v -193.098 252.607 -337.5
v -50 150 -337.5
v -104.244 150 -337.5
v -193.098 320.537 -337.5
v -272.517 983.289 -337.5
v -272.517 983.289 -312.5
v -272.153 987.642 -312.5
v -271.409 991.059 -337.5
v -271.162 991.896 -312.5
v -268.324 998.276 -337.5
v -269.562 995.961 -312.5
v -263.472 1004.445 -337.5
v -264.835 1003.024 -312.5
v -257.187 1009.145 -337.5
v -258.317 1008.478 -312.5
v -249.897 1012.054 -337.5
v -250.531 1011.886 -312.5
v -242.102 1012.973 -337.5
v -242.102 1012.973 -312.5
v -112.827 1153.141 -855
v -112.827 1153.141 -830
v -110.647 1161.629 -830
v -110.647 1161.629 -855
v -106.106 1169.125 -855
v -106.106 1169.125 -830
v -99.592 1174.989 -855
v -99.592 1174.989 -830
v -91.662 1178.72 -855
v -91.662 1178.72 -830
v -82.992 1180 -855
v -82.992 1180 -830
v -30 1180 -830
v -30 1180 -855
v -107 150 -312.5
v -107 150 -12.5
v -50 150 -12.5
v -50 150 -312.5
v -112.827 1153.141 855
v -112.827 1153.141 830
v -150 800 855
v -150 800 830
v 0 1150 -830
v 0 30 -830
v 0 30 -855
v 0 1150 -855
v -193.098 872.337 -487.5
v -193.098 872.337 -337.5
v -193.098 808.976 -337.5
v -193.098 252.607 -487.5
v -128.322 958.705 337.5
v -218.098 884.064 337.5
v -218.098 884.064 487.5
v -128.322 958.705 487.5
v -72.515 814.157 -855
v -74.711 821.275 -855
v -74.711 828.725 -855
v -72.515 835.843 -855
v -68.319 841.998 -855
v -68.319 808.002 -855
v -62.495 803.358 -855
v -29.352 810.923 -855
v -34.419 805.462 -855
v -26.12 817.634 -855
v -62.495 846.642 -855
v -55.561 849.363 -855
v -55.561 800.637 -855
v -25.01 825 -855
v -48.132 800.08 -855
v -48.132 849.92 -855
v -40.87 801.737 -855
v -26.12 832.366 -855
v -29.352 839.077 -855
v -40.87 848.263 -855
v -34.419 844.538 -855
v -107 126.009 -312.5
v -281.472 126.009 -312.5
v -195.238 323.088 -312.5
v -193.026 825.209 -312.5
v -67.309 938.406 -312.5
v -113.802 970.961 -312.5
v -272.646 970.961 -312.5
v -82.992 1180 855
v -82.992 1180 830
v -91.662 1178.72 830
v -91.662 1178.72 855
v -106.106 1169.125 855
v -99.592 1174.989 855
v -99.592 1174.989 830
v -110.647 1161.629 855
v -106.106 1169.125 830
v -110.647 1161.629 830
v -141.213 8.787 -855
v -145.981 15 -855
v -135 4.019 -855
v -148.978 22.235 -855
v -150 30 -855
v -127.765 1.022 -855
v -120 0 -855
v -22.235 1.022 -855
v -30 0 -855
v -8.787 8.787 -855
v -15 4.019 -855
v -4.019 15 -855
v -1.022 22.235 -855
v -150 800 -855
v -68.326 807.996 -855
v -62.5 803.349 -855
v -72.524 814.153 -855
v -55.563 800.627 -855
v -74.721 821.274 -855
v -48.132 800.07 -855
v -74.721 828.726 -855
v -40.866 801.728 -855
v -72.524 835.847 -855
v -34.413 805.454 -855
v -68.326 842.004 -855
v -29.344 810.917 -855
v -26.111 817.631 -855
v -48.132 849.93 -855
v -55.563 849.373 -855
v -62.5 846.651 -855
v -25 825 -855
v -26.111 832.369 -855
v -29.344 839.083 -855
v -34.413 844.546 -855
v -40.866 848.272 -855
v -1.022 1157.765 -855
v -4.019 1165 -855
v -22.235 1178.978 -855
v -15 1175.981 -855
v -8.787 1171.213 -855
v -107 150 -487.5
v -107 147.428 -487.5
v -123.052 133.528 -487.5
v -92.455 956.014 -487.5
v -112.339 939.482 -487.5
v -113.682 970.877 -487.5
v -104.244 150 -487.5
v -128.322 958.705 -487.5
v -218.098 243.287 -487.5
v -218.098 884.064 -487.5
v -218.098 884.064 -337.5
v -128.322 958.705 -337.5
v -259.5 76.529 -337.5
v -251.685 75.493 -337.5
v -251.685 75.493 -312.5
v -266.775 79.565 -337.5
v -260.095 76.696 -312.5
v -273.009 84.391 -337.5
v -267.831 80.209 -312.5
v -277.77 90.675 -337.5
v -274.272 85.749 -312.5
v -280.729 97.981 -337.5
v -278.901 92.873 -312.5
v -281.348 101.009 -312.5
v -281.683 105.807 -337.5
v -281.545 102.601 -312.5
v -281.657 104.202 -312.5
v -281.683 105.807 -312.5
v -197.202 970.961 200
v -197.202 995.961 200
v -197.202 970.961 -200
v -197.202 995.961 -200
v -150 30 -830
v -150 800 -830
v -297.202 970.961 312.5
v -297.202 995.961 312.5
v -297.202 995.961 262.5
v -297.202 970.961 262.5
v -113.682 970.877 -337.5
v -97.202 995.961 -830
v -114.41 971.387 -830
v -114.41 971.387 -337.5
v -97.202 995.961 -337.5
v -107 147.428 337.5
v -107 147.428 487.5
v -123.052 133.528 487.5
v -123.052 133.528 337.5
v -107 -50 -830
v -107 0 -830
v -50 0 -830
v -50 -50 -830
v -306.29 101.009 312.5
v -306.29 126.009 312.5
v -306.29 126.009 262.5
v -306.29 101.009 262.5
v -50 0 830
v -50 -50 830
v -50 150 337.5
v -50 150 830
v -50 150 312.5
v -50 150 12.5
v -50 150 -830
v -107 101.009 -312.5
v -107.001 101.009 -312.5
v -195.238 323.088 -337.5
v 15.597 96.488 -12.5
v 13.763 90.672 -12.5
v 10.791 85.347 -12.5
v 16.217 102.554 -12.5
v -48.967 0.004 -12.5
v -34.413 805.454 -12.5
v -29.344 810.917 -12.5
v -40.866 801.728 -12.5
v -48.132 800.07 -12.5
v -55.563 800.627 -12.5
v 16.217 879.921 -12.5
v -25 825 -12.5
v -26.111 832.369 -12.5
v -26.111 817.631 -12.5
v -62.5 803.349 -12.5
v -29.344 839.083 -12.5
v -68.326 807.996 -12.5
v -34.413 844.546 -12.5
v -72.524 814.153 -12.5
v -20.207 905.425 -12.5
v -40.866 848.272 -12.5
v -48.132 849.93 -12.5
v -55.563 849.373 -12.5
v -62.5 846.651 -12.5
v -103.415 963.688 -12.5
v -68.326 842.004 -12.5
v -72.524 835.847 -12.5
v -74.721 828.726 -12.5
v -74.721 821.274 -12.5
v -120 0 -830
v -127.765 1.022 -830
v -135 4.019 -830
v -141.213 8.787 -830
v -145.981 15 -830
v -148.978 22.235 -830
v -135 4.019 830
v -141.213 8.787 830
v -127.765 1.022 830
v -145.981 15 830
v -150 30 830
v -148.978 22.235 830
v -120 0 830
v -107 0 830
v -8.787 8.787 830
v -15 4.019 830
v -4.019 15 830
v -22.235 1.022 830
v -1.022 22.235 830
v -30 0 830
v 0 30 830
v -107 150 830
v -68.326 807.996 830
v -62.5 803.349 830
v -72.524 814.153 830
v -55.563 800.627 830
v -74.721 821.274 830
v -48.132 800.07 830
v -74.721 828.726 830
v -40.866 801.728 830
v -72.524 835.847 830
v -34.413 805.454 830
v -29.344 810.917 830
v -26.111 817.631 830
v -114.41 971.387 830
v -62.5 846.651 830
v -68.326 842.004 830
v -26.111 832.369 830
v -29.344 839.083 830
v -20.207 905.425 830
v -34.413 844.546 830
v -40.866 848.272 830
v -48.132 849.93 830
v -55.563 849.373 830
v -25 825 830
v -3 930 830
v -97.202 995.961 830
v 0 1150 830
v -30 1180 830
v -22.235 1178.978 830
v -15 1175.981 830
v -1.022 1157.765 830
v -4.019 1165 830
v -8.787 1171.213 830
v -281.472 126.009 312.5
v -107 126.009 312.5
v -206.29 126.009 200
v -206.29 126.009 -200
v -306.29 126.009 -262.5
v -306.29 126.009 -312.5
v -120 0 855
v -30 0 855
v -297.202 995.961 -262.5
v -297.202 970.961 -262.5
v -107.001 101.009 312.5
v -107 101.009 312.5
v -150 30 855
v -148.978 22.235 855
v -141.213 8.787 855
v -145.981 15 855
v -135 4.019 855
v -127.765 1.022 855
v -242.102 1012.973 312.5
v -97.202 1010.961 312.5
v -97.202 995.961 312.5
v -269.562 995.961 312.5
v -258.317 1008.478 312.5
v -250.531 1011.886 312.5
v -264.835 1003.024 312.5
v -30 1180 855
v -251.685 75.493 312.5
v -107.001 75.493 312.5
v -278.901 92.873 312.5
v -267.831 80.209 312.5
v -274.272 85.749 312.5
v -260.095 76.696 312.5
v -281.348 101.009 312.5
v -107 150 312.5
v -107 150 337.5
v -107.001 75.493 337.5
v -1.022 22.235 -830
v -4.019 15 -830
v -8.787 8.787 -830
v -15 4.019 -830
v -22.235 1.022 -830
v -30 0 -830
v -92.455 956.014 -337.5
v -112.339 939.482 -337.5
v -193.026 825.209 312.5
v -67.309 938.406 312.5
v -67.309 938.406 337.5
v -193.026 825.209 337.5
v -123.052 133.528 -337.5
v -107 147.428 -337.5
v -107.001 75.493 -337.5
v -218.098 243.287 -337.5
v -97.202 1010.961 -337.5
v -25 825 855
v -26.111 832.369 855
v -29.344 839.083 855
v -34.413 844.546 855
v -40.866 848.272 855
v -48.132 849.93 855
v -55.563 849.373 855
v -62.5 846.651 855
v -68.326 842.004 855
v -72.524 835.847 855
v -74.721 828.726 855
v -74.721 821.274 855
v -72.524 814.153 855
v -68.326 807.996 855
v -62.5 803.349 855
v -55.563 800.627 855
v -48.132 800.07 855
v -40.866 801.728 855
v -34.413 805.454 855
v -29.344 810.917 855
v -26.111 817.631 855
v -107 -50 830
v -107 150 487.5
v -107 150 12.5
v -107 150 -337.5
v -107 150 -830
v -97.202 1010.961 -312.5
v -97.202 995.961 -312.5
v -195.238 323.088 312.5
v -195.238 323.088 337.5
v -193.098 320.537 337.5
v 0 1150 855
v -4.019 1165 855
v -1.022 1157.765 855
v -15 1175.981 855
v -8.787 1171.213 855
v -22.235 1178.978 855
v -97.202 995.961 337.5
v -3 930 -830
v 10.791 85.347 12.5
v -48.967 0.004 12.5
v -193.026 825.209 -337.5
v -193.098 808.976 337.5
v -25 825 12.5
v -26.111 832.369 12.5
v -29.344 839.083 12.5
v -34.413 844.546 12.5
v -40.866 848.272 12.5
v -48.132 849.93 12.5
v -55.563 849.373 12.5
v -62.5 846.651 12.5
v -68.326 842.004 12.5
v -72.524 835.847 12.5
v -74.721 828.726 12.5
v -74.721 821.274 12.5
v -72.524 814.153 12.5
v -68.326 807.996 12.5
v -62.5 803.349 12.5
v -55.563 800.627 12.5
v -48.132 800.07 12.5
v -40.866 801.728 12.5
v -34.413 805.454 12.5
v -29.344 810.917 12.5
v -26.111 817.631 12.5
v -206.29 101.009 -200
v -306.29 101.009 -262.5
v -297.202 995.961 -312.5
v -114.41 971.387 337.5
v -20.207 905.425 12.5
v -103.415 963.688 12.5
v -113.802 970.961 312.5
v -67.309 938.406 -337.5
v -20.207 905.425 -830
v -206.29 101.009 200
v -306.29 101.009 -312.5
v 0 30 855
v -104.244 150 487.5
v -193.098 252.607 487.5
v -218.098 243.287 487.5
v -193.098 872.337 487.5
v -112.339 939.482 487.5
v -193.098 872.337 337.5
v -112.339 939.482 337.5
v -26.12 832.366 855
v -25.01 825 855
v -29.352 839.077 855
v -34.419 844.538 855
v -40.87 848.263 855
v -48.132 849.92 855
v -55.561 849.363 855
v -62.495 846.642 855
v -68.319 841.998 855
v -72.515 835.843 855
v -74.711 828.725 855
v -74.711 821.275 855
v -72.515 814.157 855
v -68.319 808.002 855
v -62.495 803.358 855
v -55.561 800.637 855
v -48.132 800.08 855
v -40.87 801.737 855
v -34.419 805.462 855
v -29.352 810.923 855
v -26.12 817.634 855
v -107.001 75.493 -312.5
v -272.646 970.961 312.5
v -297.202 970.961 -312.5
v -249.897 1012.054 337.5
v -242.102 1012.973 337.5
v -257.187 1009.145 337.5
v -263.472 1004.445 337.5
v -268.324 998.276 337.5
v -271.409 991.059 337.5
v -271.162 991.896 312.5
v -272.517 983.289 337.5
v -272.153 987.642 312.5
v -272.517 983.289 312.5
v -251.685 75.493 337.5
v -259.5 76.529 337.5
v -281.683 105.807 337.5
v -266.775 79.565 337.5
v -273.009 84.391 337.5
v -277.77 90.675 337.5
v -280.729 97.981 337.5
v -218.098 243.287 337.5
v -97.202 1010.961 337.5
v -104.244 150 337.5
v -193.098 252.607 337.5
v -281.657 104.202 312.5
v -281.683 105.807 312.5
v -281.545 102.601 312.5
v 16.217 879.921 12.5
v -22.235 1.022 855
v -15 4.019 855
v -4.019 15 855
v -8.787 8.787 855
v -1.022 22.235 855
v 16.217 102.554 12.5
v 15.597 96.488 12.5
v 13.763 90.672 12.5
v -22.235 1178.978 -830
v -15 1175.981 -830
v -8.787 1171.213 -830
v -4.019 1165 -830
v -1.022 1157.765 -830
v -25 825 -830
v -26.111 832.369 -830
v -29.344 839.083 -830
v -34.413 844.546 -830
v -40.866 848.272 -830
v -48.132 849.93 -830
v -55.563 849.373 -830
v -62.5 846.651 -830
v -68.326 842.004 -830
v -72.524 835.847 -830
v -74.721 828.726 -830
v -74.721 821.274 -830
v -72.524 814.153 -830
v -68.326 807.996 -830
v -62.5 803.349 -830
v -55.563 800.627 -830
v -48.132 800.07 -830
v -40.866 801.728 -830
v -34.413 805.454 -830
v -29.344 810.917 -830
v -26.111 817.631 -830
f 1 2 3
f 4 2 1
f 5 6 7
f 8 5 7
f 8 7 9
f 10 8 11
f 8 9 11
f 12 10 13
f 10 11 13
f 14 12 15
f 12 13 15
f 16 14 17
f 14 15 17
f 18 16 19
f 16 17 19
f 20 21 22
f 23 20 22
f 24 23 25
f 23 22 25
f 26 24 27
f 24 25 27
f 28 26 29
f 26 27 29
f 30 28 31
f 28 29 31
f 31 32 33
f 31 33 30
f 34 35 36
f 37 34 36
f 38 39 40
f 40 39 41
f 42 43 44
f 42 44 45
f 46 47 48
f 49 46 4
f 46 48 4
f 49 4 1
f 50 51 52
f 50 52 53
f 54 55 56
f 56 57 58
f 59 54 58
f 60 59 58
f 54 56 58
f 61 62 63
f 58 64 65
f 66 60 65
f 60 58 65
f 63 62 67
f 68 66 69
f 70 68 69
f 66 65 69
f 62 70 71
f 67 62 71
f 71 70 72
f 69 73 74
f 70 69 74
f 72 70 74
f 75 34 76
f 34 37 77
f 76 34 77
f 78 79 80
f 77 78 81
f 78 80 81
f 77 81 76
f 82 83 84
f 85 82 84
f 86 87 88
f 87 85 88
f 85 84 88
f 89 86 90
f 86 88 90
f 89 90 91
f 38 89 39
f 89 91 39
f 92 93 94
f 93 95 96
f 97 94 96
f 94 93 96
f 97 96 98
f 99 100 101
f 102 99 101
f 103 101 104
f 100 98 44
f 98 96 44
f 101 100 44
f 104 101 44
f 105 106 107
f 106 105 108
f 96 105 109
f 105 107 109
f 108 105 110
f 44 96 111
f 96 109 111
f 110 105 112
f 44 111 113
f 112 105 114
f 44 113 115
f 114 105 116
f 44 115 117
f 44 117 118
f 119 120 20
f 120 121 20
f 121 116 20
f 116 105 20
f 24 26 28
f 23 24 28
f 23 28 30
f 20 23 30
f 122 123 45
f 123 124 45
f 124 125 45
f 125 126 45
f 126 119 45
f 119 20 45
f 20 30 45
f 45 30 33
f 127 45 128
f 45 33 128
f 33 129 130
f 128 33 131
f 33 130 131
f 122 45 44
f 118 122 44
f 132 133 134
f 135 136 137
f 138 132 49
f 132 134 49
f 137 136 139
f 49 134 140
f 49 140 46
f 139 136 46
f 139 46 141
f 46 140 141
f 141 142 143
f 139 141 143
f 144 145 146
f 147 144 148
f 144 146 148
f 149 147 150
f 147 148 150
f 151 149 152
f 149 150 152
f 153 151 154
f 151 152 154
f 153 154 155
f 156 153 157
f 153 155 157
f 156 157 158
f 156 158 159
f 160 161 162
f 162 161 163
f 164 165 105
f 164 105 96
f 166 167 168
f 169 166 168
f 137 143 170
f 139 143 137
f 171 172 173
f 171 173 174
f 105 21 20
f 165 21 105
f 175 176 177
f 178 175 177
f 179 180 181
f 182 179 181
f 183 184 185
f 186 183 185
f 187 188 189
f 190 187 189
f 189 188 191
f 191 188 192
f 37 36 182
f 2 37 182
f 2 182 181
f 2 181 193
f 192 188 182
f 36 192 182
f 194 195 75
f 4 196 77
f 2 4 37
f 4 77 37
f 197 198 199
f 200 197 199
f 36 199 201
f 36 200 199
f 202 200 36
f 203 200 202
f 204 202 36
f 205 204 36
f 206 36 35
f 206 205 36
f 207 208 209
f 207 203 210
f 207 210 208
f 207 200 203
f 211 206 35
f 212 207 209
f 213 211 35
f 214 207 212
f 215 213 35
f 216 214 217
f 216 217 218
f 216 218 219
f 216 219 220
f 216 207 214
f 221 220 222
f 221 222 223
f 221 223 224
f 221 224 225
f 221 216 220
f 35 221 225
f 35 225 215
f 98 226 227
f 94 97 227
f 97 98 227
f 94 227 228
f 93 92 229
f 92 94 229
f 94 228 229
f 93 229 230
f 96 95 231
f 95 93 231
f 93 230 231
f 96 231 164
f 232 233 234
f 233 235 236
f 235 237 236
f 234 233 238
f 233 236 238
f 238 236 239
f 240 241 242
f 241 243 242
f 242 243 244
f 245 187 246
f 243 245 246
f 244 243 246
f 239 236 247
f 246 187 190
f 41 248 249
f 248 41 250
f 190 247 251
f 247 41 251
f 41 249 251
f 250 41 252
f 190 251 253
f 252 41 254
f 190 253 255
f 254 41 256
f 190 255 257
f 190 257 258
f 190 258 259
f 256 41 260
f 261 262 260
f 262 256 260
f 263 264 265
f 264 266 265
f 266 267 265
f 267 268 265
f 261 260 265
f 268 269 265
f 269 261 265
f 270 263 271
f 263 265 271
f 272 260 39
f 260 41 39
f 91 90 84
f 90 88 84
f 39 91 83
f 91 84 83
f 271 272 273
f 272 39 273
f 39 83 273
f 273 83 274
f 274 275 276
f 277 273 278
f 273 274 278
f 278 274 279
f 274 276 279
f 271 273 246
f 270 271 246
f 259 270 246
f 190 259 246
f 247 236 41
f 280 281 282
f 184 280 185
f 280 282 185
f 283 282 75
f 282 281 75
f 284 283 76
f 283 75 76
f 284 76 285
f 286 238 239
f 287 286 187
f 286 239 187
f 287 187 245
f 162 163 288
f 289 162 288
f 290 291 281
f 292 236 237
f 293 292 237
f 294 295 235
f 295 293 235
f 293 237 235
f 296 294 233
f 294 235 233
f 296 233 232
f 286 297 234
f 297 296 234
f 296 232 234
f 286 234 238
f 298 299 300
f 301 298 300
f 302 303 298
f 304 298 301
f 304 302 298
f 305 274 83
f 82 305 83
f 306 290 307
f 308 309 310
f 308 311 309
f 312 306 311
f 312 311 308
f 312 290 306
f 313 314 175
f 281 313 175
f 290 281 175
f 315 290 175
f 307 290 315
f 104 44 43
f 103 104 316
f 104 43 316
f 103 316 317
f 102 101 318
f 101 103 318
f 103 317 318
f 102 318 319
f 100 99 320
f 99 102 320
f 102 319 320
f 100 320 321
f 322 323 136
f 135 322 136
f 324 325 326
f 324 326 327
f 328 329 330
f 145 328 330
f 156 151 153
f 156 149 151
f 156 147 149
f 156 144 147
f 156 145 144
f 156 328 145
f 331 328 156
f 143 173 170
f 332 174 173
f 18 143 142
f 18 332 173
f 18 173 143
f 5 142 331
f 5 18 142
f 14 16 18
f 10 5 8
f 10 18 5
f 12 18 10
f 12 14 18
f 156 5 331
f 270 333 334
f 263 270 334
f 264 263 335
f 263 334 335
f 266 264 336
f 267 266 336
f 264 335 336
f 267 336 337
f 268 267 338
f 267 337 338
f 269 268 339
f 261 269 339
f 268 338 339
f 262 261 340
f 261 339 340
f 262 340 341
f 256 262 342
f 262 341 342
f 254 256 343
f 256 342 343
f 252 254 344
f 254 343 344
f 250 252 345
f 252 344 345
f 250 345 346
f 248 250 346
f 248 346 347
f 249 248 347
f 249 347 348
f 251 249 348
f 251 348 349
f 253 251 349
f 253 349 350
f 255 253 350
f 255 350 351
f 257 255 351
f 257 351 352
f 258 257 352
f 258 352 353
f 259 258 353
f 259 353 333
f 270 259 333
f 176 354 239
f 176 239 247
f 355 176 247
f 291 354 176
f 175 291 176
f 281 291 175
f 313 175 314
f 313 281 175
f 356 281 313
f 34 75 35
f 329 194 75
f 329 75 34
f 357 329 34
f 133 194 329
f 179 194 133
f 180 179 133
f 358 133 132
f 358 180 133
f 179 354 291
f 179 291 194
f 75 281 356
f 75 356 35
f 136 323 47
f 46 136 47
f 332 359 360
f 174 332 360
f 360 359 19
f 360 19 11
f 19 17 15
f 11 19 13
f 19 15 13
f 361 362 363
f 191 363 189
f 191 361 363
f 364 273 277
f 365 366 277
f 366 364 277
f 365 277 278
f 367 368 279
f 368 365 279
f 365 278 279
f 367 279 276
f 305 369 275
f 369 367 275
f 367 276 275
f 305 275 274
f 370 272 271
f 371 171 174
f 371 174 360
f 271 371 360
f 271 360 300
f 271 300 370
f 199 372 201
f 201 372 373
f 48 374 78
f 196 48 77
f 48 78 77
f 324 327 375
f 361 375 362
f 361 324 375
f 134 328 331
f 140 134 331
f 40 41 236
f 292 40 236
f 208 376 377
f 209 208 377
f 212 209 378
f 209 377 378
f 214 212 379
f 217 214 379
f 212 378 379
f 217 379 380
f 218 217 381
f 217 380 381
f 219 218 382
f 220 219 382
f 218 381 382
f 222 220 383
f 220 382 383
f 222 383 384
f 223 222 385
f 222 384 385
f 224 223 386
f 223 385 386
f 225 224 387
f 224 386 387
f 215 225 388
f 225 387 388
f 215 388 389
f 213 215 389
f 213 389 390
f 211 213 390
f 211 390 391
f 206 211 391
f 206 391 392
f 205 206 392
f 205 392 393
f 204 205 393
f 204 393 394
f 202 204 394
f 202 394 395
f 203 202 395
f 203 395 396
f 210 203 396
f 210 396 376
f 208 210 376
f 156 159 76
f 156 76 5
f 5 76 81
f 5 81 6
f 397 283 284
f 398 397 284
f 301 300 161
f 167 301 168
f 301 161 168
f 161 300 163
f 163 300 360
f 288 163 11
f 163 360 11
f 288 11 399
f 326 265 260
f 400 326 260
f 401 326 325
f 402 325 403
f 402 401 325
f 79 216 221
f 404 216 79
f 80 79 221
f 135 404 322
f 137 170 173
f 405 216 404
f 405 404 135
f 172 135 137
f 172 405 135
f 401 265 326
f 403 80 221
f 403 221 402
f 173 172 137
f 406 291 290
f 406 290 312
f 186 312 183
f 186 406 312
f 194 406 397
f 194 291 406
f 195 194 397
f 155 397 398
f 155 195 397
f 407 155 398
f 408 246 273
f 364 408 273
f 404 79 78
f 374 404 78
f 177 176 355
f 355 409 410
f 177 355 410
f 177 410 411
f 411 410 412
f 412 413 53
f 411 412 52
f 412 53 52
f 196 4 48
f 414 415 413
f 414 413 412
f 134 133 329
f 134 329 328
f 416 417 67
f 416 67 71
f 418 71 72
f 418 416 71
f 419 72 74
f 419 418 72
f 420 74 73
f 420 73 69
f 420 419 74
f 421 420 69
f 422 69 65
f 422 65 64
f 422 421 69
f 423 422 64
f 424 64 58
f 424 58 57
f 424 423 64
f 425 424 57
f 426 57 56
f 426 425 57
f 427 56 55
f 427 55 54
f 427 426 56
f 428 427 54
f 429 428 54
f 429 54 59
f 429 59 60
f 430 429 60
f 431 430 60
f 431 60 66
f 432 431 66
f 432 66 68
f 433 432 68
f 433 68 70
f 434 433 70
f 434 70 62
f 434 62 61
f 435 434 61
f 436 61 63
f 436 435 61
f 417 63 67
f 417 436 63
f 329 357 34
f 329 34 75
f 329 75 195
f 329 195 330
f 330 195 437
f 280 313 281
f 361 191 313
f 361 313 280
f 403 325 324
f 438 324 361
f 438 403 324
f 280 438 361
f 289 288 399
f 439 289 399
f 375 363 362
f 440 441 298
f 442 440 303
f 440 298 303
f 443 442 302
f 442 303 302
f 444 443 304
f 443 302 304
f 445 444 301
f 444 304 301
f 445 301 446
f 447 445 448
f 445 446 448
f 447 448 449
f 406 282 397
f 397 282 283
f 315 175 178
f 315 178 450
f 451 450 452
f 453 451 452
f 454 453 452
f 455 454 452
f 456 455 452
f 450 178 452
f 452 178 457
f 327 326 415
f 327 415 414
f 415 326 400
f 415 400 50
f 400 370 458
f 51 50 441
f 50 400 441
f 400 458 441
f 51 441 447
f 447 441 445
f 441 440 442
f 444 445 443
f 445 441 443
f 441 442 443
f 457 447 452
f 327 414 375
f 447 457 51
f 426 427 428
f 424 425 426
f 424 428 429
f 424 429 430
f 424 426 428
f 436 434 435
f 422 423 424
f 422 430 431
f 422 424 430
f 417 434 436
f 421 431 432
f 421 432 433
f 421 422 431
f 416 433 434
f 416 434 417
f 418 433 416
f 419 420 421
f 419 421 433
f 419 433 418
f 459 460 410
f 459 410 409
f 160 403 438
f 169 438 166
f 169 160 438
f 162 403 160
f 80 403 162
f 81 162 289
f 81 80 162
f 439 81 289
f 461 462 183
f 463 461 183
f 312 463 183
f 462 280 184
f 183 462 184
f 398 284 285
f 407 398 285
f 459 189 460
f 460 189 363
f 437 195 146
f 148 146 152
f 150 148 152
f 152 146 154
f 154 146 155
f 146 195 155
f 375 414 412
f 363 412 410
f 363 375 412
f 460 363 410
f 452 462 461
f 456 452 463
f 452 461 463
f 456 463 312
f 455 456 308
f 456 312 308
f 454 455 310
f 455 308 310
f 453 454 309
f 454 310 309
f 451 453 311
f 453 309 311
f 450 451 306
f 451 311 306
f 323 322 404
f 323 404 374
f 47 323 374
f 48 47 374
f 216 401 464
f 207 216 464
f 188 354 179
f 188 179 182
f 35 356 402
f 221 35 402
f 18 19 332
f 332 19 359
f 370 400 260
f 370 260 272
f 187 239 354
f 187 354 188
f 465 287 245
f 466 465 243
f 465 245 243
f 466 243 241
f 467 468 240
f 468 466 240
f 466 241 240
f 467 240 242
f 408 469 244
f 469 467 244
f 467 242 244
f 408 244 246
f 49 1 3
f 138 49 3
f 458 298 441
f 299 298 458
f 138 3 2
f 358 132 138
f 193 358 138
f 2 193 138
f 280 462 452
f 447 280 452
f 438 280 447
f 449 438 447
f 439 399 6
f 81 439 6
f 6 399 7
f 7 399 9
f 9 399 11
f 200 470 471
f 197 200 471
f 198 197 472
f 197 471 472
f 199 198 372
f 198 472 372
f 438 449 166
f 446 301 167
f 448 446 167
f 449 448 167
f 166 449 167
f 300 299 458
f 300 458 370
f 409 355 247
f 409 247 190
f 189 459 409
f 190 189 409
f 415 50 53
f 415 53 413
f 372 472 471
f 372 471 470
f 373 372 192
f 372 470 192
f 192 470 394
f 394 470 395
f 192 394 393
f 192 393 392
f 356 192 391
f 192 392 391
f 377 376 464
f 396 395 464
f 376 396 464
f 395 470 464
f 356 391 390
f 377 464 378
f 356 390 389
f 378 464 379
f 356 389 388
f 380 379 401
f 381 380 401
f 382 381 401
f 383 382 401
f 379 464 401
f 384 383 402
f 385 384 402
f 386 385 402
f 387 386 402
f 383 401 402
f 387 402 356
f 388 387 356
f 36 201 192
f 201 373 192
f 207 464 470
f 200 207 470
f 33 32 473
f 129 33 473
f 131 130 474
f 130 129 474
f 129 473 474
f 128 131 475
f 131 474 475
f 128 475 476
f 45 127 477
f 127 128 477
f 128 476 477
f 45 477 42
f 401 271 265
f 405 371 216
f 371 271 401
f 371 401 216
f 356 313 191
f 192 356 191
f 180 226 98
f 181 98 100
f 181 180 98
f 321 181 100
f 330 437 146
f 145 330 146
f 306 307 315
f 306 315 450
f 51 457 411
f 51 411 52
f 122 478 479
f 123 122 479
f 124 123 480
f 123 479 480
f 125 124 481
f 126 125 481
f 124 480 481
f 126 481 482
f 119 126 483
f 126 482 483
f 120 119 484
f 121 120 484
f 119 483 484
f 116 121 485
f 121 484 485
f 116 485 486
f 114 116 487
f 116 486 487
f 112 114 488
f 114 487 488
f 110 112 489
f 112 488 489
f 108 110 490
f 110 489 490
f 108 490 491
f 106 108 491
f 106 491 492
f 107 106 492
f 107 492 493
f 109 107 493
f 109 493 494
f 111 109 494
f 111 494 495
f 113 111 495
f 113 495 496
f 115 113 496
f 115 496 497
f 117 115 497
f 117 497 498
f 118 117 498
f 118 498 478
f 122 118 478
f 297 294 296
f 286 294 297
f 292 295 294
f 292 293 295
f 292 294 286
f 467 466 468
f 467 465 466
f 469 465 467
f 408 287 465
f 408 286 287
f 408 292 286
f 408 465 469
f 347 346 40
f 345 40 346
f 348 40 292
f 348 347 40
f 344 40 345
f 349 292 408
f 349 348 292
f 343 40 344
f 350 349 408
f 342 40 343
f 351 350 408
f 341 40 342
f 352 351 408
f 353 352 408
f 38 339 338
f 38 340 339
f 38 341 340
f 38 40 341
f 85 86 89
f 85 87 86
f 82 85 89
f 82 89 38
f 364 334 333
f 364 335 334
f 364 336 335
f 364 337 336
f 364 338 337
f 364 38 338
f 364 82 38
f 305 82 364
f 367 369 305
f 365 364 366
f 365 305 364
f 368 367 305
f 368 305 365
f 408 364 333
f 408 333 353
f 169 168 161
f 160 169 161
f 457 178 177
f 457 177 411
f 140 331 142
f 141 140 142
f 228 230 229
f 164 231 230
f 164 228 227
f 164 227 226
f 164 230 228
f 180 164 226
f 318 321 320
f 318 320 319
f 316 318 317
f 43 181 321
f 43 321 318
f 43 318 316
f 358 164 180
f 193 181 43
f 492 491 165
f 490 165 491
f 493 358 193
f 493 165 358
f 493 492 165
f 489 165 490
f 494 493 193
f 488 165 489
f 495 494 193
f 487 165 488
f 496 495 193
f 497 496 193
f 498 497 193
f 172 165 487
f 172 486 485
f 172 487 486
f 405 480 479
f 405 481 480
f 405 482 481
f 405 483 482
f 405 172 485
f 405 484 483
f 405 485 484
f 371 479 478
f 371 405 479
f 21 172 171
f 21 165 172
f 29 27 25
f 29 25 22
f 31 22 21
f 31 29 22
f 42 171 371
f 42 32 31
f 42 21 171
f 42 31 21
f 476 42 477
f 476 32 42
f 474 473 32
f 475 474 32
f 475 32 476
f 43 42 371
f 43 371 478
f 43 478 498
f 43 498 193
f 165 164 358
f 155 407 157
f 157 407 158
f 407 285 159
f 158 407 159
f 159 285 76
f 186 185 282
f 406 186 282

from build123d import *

# Parameters (mm, degrees)
BOSS_EXTRUDE2_START  = 830
BOSS_EXTRUDE2_DEPTH  = 25
BOSS_EXTRUDE3_START  = -830
BOSS_EXTRUDE3_DEPTH  = 25
SKETCH2_W            = 57
SKETCH2_H            = 200
BOSS_EXTRUDE4_DEPTH  = 1660
BOSS_EXTRUDE5_DEPTH  = 12.5
SKETCH4_R            = 25
CUT_EXTRUDE1_DEPTH   = 2084.026644093
SKETCH5_R            = 24.99
BOSS_EXTRUDE6_DEPTH  = 1710
BOSS_EXTRUDE9_START  = 300
BOSS_EXTRUDE9_DEPTH  = 25
EXTRUDE_THIN11_DEPTH = 150
BOSS_EXTRUDE10_REACH = 1385.667
SKETCH12_W           = 150
SKETCH12_H           = 25
BOSS_EXTRUDE11_DEPTH = 25
LPATTERN1_COUNT      = 2
LPATTERN1_PITCH      = 870
FILLET1_R            = 30


with BuildPart() as part:
    # Sketch1 → Boss-Extrude2 (new body)
    with BuildSketch(Plane.XY.offset(BOSS_EXTRUDE2_START)):
        Polygon((0, 0), (0, 1180), (-110, 1180), (-150, 800), (-150, 0), align=None)
    extrude(amount=BOSS_EXTRUDE2_DEPTH)



with BuildPart() as body_2:
    # Sketch1<2> → Boss-Extrude3 (new body)
    with BuildSketch(Plane.XY.offset(BOSS_EXTRUDE3_START)):
        Polygon((0, 0), (0, 1180), (-110, 1180), (-150, 800), (-150, 0), align=None)
    extrude(amount=-BOSS_EXTRUDE3_DEPTH)


with BuildPart() as part_1:
    add(part.part)

    add(body_2.part)  # Boss-Extrude4 merges body 2
    # Sketch2 → Boss-Extrude4 (add)
    with BuildSketch(Plane.XY.offset(-830)):
        Polygon((-3, 930), (-20.207293091, 905.425438671), (-114.409778184, 971.386728852), (-97.202485093, 995.96129018), align=None)
        with Locations((-78.5, 50)):
            Rectangle(SKETCH2_W, SKETCH2_H)
    extrude(amount=BOSS_EXTRUDE4_DEPTH)

    # Sketch3 → Boss-Extrude5 (add, symmetric)
    with BuildSketch(Plane.XY):
        Polygon((-103.415345034, 963.688343882), (16.216787549, 879.921022835), (16.216787549, 93.095347735), (-48.966785029, 0.003558486), (-50, 150), (-107, 150), align=None)
    extrude(amount=BOSS_EXTRUDE5_DEPTH, both=True)

    # Sketch4 → Cut-Extrude1 (cut, through all)
    with BuildSketch(Plane.XY.offset(855)):
        with Locations((-50, 825)):
            Circle(SKETCH4_R)
    extrude(amount=-CUT_EXTRUDE1_DEPTH, mode=Mode.SUBTRACT)

    # Sketch6 → Boss-Extrude9 (add)
    with BuildSketch(Plane(origin=(0, 0, -12.5), x_dir=(-1, 0, 0), z_dir=(0, 0, -1)).offset(BOSS_EXTRUDE9_START)):
        Polygon((50, 150), (107, 150), (107.001473273, 75.493341843), (282, 75.493341843), (272.202485093, 1013.390328918), (97.202485093, 1010.96129018), (97.202485093, 995.96129018), (114.409778184, 971.386728852), (67.308535637, 938.406083762), (193.026269643, 825.209327623), (195.238333547, 323.088305787), align=None)
    boss_extrude9 = extrude(amount=BOSS_EXTRUDE9_DEPTH)

    # Sketch11 → Extrude-Thin11 (add)
    with BuildSketch(Plane(origin=(0, 0, -337.5), x_dir=(-1, 0, 0), z_dir=(0, 0, -1))):
        Polygon((112.33881046, 939.48170169), (193.097782618, 872.337456037), (193.097782618, 252.607341749), (104.152637174, 149.894006612), (123.051517504, 133.528423142), (218.097782618, 243.287295687), (218.097782618, 884.064103947), (128.321649968, 958.705354861), align=None)
    extrude_thin11 = extrude(amount=EXTRUDE_THIN11_DEPTH)

    # Sketch12 → Boss-Extrude10 (add, up to next)
    with BuildSketch(Plane(origin=(395.423561528, 328.761201919, 0), x_dir=(0, 0, -1), z_dir=(0.7689461268447529, 0.6393135803425837, 0)), mode=Mode.PRIVATE) as boss_extrude10_sk1:
        with Locations((412.5, 806.730542883)):
            Rectangle(SKETCH12_W, SKETCH12_H)
    boss_extrude10_tool1 = extrude(boss_extrude10_sk1.sketch, amount=BOSS_EXTRUDE10_REACH, mode=Mode.PRIVATE) - part_1.part
    add(boss_extrude10_tool1.solids().sort_by_distance((-120.33023, 949.093528, -412.5))[0])

    # Mirror1: Boss-Extrude9, Extrude-Thin11 across plane
    add(boss_extrude9.mirror(Plane.XY))
    add(extrude_thin11.mirror(Plane.XY))

    # Sketch13 → Boss-Extrude11 (add)
    with BuildSketch(Plane(origin=(0, 995.96129018, 0), x_dir=(1, 0, 0), z_dir=(0, 1, 0))):
        Polygon((-297.202485093, 312.5), (-97.202485093, 312.5), (-97.202485093, -312.5), (-297.202485093, -312.5), (-297.202485093, -262.5), (-197.202485093, -200), (-197.202485093, 200), (-297.202485093, 262.5), align=None)
    boss_extrude11 = extrude(amount=-BOSS_EXTRUDE11_DEPTH)

    # LPattern1: Boss-Extrude11 ×2
    with Locations(*[Vector(-0.01044568914487086, -0.9999454423008731, 0) * (i * LPATTERN1_PITCH) for i in range(1, LPATTERN1_COUNT)]):
        add(boss_extrude11)

    # Fillet1
    # the kernel refuses this fillet: 30 mm, written as the material it takes off along each edge
    with BuildSketch(Plane(origin=(-282, 75.493341843, -312.5), x_dir=(1, 0, 0), z_dir=(0, 0, -1))) as fillet1_piece_1:
        with BuildLine():
            CenterArc((FILLET1_R * 1.01050081974, -FILLET1_R), FILLET1_R, 90, 90.598504786)
            Line((FILLET1_R * 0.0105553774437, -FILLET1_R * 1.01044568914), (0, 0))
            Line((0, 0), (FILLET1_R * 1.01050081974, 0))
        make_face()
    extrude(amount=100.787561481, mode=Mode.SUBTRACT)
    with BuildSketch(Plane(origin=(-272.202485093, 1013.390328918, -312.5), x_dir=(0.9999036836445534, -0.01387888446716093, 0), z_dir=(0, 0, -1))) as fillet1_piece_2:
        with BuildLine():
            CenterArc((FILLET1_R * 1.00343935877, FILLET1_R), FILLET1_R, 179.803277751, 90.196722249)
            Line((FILLET1_R * 0.00344525305947, FILLET1_R * 1.00343344421), (0, 0))
            Line((0, 0), (FILLET1_R * 1.00343935877, 0))
        make_face()
    extrude(amount=100.257951908, mode=Mode.SUBTRACT)
    with BuildSketch(Plane(origin=(-272.202485093, 1013.390328918, 312.5), x_dir=(0.9999036836445534, -0.01387888446716093, 0), z_dir=(0, 0, 1))) as fillet1_piece_3:
        with BuildLine():
            CenterArc((FILLET1_R * 1.00343935877, -FILLET1_R), FILLET1_R, 90, 90.196722249)
            Line((FILLET1_R * 0.00344525305947, -FILLET1_R * 1.00343344421), (0, 0))
            Line((0, 0), (FILLET1_R * 1.00343935877, 0))
        make_face()
    extrude(amount=100.257951908, mode=Mode.SUBTRACT)
    with BuildSketch(Plane(origin=(-282, 75.493341843, 312.5), x_dir=(1, 0, 0), z_dir=(0, 0, 1))) as fillet1_piece_4:
        with BuildLine():
            CenterArc((FILLET1_R * 1.01050081974, FILLET1_R), FILLET1_R, 179.401495214, 90.598504786)
            Line((FILLET1_R * 0.0105553774437, FILLET1_R * 1.01044568914), (0, 0))
            Line((0, 0), (FILLET1_R * 1.01050081974, 0))
        make_face()
    extrude(amount=100.787561481, mode=Mode.SUBTRACT)
    with BuildSketch(Plane(origin=(0, 0, -755), x_dir=(-1, 0, 0), z_dir=(0, 0, -1)), Plane(origin=(0, 1180, -755), x_dir=(0, -1, 0), z_dir=(0, 0, -1)), Plane(origin=(-150, 0, 755), x_dir=(1, 0, 0), z_dir=(0, 0, 1)), Plane(origin=(0, 0, 755), x_dir=(0, 1, 0), z_dir=(0, 0, 1))) as fillet1_piece_5:
        with BuildLine():
            CenterArc((FILLET1_R, FILLET1_R), FILLET1_R, 180, 90)
            Line((0, FILLET1_R), (0, 0))
            Line((0, 0), (FILLET1_R, 0))
        make_face()
    extrude(amount=175, mode=Mode.SUBTRACT)
    with BuildSketch(Plane(origin=(-150, 0, -755), x_dir=(1, 0, 0), z_dir=(0, 0, -1)), Plane(origin=(0, 1180, 755), x_dir=(0, -1, 0), z_dir=(0, 0, 1))) as fillet1_piece_6:
        with BuildLine():
            CenterArc((FILLET1_R, -FILLET1_R), FILLET1_R, 90, 90)
            Line((0, -FILLET1_R), (0, 0))
            Line((0, 0), (FILLET1_R, 0))
        make_face()
    extrude(amount=175, mode=Mode.SUBTRACT)
    with BuildSketch(Plane(origin=(-110, 1180, -762.480369048), x_dir=(1, 0, 0), z_dir=(0, 0, -1))) as fillet1_piece_7:
        with BuildLine():
            CenterArc((FILLET1_R * 0.900261746029, FILLET1_R), FILLET1_R, 186.009005957, 83.990994043)
            Line((-FILLET1_R * 0.0942437068928, FILLET1_R * 0.895315215482), (0, 0))
            Line((0, 0), (FILLET1_R * 0.900261746029, 0))
        make_face()
    extrude(amount=160.039261904, mode=Mode.SUBTRACT)
    with BuildSketch(Plane(origin=(16.216787549, 93.095347735, 36.147409166), x_dir=(-0.5735764363510503, -0.8191520442889889, 0), z_dir=(0, 0, -1))) as fillet1_piece_8:
        with BuildLine():
            CenterArc((FILLET1_R * 0.315298788879, FILLET1_R), FILLET1_R, 235, 35)
            Line((-FILLET1_R * 0.258277647472, FILLET1_R * 0.180847955711), (0, 0))
            Line((0, 0), (FILLET1_R * 0.315298788879, 0))
        make_face()
    extrude(amount=72.294818332, mode=Mode.SUBTRACT)
    with BuildSketch(Plane(origin=(-110, 1180, 762.480369048), x_dir=(1, 0, 0), z_dir=(0, 0, 1))) as fillet1_piece_9:
        with BuildLine():
            CenterArc((FILLET1_R * 0.900261746029, -FILLET1_R), FILLET1_R, 90, 83.990994043)
            Line((-FILLET1_R * 0.0942437068928, -FILLET1_R * 0.895315215482), (0, 0))
            Line((0, 0), (FILLET1_R * 0.900261746029, 0))
        make_face()
    extrude(amount=160.039261904, mode=Mode.SUBTRACT)


with BuildPart() as body_2_2:
    # Sketch5 → Boss-Extrude6 (new body)
    with BuildSketch(Plane.XY.offset(855)):
        with Locations((-50, 825)):
            Circle(SKETCH5_R)
    extrude(amount=-BOSS_EXTRUDE6_DEPTH)


solid = Compound([part_1.part, body_2_2.part])
